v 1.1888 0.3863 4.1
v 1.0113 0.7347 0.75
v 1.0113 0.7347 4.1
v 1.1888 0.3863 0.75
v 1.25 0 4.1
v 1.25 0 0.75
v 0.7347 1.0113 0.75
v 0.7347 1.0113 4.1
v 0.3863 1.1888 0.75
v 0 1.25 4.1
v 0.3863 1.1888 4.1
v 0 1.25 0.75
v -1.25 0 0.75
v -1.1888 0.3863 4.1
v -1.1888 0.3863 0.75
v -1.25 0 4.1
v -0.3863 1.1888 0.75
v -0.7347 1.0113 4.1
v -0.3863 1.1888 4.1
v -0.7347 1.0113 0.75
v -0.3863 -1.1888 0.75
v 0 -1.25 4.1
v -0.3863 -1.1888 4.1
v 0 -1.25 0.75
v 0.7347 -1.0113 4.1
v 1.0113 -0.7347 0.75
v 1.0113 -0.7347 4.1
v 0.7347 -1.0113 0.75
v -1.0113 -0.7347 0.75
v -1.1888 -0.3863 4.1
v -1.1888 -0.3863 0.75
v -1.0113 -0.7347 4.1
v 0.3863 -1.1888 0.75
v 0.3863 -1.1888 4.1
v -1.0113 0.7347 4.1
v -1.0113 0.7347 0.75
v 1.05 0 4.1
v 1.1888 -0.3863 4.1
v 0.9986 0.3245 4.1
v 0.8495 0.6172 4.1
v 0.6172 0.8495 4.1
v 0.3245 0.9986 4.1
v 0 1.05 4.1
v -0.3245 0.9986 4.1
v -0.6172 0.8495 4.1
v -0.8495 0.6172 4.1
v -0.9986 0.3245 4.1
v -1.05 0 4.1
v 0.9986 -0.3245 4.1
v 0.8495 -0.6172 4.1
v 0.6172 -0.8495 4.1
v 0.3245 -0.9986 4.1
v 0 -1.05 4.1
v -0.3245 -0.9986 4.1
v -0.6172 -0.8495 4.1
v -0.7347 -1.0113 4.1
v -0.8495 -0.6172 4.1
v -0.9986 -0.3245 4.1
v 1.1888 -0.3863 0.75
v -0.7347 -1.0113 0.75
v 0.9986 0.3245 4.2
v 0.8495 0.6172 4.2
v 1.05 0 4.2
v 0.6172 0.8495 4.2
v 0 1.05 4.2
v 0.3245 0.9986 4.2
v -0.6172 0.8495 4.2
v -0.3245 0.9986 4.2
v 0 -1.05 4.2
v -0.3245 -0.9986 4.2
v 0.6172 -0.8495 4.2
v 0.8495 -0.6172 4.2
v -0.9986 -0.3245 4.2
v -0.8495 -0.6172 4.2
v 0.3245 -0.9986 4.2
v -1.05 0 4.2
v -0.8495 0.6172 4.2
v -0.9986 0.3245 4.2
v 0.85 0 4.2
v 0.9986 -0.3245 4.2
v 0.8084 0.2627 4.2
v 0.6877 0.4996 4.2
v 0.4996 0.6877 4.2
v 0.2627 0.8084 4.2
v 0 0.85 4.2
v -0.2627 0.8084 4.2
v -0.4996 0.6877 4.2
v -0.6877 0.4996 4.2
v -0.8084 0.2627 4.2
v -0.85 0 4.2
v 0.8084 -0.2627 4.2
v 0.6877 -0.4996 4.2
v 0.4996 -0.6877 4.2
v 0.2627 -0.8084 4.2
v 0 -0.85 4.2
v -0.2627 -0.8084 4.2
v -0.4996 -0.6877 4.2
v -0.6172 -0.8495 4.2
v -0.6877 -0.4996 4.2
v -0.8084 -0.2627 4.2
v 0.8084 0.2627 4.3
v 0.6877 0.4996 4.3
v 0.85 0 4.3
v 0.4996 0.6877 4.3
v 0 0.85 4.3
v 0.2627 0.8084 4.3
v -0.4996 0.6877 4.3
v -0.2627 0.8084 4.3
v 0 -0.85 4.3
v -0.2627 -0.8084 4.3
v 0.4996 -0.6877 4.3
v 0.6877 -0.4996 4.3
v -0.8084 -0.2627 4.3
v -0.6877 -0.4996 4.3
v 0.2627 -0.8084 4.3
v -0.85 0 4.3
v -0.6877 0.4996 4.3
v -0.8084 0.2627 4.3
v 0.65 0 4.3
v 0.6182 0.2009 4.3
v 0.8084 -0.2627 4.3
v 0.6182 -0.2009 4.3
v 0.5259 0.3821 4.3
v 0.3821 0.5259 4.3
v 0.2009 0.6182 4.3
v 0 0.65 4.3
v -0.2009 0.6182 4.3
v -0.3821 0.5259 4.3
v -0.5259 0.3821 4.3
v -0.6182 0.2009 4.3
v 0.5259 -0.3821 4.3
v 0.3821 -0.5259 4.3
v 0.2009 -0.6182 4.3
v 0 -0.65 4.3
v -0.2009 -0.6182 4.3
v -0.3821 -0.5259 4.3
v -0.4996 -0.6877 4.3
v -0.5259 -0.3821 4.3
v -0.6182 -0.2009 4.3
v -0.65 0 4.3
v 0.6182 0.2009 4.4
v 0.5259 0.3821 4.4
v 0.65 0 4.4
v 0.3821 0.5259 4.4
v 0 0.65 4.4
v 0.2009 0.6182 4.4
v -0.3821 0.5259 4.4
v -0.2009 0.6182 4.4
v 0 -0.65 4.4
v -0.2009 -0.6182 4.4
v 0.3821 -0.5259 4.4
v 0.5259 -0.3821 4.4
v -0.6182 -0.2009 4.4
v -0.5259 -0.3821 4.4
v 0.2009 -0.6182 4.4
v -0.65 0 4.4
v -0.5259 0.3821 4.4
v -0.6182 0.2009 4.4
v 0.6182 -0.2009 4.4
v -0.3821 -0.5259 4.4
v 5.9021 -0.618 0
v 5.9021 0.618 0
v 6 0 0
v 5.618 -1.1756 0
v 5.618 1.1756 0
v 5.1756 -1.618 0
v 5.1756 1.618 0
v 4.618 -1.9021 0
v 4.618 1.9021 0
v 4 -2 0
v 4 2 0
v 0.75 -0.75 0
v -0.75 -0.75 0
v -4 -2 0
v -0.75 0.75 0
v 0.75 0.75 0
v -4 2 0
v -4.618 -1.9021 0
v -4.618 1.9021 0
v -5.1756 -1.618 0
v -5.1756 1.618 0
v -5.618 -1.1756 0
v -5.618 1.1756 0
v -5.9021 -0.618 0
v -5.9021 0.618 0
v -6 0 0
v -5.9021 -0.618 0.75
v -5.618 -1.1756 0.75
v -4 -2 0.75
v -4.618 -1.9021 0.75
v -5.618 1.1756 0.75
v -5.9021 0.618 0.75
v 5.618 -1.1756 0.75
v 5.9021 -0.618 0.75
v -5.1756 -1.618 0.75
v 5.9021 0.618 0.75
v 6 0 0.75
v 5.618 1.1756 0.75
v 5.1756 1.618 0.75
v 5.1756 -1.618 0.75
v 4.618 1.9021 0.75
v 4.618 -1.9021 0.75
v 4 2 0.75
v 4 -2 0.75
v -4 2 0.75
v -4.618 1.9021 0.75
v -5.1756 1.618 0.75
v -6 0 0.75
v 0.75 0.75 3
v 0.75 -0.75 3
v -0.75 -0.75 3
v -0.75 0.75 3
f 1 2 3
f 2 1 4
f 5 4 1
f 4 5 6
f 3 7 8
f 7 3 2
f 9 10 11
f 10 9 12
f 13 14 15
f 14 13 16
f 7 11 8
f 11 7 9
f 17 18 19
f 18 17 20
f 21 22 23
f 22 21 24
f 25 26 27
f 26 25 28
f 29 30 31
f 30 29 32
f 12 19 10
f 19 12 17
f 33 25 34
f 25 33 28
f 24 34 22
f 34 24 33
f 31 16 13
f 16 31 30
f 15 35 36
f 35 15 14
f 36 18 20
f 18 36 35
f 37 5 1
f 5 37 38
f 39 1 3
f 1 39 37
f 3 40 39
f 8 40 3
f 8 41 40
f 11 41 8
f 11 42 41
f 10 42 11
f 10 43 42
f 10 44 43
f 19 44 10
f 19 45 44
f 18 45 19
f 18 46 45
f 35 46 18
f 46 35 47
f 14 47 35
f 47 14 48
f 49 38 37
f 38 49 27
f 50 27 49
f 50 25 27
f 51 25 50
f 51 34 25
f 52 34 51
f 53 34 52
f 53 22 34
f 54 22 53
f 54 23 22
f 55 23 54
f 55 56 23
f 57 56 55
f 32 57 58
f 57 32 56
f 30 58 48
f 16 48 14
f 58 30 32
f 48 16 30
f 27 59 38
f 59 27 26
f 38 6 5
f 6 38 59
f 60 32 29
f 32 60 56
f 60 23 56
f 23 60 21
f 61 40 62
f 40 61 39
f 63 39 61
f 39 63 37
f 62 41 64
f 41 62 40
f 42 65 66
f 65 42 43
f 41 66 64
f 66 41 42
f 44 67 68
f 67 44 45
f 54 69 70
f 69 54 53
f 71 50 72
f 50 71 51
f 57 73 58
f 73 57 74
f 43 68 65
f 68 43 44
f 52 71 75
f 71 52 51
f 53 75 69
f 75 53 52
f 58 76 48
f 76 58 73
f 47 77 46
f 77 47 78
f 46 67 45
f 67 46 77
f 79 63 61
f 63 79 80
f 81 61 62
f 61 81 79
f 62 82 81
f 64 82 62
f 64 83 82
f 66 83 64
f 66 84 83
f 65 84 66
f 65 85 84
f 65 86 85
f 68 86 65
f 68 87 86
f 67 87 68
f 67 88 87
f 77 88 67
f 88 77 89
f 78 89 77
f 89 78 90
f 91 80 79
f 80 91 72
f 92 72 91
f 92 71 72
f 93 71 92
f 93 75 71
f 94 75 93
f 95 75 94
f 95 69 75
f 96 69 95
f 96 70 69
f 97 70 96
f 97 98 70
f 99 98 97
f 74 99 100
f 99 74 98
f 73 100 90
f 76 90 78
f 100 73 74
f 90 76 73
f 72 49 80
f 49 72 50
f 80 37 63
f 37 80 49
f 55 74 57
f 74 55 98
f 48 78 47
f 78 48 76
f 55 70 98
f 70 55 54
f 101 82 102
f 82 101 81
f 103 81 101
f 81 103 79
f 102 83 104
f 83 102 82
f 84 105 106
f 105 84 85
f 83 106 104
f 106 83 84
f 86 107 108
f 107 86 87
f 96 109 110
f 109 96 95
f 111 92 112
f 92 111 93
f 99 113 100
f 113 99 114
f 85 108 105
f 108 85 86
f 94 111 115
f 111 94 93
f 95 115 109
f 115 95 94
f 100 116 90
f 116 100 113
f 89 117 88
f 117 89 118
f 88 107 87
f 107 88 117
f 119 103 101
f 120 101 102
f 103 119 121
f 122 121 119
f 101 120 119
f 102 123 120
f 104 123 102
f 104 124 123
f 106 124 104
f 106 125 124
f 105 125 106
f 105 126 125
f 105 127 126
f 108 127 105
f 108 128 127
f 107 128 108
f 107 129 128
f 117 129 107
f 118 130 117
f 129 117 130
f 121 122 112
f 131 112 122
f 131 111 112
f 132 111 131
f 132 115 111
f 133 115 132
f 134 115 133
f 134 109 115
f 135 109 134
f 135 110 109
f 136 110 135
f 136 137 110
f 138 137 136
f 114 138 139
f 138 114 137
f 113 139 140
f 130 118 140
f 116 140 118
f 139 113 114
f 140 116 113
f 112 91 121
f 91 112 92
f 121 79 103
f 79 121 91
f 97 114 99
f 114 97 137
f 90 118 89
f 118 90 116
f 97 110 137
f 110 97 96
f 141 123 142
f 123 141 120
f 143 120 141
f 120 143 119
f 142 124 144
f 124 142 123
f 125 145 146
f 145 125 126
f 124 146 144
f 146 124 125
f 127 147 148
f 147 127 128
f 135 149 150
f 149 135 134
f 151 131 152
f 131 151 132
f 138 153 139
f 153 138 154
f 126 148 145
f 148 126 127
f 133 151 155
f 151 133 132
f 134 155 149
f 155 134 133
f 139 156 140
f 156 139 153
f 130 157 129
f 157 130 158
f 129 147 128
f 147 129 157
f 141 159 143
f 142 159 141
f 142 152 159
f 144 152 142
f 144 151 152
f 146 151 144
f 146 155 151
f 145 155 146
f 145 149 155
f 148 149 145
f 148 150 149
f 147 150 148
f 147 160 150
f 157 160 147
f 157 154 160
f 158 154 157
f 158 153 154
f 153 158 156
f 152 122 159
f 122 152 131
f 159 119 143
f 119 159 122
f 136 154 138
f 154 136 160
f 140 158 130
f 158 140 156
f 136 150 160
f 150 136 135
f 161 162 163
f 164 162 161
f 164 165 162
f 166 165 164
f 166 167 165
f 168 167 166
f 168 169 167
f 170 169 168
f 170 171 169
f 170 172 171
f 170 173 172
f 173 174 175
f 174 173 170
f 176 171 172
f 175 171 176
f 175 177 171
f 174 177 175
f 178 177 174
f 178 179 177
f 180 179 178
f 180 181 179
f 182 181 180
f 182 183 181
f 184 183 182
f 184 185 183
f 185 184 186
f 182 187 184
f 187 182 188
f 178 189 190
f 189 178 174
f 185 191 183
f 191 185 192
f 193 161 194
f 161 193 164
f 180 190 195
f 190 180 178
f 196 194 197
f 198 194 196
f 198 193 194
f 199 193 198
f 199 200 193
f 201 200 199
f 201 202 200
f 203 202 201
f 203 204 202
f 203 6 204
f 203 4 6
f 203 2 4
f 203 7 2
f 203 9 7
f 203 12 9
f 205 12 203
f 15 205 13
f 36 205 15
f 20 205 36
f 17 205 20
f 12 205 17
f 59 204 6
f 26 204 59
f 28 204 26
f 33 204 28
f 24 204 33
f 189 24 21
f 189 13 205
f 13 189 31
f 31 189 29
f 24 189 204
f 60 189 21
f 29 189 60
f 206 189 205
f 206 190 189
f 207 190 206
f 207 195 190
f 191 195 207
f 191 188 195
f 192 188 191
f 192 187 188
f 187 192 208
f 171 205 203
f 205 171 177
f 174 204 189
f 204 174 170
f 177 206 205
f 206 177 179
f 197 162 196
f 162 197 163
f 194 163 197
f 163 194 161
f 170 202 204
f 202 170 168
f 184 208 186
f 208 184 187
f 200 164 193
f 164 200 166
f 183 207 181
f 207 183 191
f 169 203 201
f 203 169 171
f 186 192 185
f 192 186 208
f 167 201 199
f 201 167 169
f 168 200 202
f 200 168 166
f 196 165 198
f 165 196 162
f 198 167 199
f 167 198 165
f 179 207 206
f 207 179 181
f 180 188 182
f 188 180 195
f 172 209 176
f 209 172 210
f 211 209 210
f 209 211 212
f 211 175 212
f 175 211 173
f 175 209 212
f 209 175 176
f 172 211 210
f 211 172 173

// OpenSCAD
difference(){
    union(){
        cylinder(h = 4, r = 1.25, $fn = 20);
        for(i = [0:0.1:0.3]) {
            translate([0,0, 4 + i])  {
                cylinder(h = 0.1, r = 1.25 - i * 2, $fn = 20);
            }
        }
        hull(){
            translate([4,0,0]) cylinder(h = 0.75, r = 2, $fn = 20);    
            translate([-4,0,0]) cylinder(h = 0.75, r = 2, $fn = 20);
        }
    }
    cube([1.5,1.5,6], center = true);  
}
